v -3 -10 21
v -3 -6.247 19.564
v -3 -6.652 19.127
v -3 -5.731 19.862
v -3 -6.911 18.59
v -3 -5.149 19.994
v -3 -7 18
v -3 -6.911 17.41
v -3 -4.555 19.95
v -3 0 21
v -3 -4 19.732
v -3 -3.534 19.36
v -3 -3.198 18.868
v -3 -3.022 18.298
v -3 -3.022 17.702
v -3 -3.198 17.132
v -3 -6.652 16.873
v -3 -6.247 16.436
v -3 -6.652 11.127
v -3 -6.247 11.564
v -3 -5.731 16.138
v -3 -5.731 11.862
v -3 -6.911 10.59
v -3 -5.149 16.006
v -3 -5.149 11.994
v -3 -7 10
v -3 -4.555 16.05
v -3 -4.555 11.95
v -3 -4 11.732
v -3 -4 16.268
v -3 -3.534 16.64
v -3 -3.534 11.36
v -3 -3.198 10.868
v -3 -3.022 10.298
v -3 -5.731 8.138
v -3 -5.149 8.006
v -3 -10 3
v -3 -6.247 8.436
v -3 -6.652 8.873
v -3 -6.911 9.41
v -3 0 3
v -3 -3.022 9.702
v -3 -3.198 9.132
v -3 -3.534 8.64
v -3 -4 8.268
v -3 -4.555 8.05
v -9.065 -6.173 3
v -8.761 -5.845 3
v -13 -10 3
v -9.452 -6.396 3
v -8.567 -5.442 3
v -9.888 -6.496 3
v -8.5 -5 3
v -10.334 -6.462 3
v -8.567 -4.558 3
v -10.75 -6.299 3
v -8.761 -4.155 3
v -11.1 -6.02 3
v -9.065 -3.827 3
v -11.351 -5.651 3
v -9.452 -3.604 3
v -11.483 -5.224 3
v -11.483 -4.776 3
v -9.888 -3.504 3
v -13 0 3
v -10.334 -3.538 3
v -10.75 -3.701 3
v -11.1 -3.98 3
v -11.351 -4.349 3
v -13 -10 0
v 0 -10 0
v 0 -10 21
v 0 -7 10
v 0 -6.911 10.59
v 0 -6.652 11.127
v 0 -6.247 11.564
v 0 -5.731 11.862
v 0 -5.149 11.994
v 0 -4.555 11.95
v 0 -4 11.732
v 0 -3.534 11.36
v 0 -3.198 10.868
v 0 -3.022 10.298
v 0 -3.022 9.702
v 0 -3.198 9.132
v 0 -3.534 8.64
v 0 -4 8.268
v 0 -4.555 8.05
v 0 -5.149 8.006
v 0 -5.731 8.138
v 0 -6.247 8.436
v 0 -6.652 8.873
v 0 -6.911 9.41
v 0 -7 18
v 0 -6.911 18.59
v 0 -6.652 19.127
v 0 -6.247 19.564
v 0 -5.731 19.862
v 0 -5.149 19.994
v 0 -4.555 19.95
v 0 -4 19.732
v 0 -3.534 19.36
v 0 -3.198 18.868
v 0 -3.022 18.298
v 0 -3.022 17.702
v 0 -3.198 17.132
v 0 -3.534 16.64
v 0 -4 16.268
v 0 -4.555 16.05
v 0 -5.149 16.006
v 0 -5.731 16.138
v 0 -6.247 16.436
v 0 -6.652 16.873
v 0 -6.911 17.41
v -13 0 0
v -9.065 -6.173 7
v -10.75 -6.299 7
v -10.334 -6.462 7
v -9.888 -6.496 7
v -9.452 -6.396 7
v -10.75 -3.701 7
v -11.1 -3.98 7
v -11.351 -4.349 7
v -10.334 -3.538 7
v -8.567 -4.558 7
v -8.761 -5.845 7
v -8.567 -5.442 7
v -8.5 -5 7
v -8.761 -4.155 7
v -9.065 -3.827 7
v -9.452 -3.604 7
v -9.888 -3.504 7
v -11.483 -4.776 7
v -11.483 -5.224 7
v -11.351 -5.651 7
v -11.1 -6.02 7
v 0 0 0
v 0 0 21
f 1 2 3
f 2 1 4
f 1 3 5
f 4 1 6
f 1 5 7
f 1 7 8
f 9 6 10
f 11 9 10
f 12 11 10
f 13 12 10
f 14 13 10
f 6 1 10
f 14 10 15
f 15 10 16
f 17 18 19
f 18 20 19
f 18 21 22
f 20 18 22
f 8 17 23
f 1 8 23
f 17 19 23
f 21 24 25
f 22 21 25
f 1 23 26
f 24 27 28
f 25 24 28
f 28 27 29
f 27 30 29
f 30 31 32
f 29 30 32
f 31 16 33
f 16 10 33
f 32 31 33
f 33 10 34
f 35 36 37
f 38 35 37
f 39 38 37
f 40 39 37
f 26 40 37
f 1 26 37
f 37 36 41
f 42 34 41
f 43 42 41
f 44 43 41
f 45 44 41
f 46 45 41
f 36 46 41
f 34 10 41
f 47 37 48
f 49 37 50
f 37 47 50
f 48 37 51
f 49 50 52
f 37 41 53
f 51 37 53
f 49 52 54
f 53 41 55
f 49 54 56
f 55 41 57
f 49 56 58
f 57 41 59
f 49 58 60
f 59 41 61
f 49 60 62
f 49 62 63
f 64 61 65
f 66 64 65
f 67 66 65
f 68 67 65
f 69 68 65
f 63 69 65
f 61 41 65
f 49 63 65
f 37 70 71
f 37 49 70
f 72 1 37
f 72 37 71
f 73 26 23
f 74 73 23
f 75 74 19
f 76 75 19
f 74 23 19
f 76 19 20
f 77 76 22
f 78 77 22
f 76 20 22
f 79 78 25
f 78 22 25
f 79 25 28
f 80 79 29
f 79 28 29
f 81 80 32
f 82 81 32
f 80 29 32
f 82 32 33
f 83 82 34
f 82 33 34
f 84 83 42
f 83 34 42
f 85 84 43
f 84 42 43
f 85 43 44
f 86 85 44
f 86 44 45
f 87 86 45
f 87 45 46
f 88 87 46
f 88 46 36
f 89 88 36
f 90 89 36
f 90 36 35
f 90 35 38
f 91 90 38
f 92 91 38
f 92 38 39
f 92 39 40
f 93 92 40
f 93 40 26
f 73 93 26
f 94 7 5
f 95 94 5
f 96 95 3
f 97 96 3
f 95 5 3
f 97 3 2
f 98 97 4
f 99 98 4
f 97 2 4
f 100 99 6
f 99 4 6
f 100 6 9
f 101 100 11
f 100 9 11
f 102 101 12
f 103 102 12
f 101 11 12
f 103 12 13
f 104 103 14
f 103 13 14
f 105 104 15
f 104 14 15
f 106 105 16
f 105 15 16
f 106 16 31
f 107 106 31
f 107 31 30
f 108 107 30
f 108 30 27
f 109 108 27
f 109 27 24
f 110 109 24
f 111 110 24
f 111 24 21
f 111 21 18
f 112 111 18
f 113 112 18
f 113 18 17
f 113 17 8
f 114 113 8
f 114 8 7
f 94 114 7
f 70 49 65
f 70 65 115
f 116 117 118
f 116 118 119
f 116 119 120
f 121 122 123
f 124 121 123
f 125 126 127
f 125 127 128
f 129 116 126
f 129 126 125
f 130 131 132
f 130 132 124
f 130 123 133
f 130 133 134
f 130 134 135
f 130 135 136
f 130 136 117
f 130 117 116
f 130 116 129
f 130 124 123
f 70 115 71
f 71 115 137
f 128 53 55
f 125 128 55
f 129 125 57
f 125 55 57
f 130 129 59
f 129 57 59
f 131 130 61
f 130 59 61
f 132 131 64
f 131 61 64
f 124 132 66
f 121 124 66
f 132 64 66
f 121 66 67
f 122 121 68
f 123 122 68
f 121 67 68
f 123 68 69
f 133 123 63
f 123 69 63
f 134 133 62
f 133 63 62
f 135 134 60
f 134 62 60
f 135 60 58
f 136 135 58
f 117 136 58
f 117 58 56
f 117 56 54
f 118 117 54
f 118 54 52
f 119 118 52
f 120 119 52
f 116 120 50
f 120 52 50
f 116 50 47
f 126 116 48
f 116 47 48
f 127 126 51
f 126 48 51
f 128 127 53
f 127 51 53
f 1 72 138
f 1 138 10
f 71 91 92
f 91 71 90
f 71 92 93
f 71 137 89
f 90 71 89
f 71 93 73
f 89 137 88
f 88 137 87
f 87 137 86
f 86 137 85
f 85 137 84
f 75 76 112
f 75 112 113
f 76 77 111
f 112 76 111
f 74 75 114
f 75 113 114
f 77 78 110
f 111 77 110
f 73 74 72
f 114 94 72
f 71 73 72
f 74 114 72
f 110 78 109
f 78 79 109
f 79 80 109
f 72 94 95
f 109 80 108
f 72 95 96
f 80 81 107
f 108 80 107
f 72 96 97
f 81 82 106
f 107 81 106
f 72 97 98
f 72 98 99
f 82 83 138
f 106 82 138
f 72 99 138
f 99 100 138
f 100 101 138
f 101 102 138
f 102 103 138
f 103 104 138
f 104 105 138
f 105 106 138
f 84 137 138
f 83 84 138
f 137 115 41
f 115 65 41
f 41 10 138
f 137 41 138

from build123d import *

# Parameters (mm, degrees)
F1_DEPTH = 10
F2_R     = 2
F3_DEPTH = 25
F4_R     = 1.5
F5_DEPTH = 4


with BuildPart() as f1:
    # F0 (on Front) → F1 (new body)
    with BuildSketch(Plane.XZ):
        Polygon((-13, 0), (0, 0), (0, 21), (-3, 21), (-3, 3), (-13, 3), align=None)
    extrude(amount=F1_DEPTH)

    # F2 (on face) → F3 (cut)
    with BuildSketch(Plane(origin=(-3, 0, 0), x_dir=(0, -1, 0), z_dir=(-1, 0, 0))):
        with Locations((5, 18)):
            Circle(F2_R)
        with Locations((5, 10)):
            Circle(F2_R)
    extrude(amount=-F3_DEPTH, mode=Mode.SUBTRACT)

    # F4 (on face) → F5 (join)
    with BuildSketch(Plane.XY.offset(3)):
        with Locations((-10, -5)):
            Circle(F4_R)
    extrude(amount=F5_DEPTH)


solid = f1.part
